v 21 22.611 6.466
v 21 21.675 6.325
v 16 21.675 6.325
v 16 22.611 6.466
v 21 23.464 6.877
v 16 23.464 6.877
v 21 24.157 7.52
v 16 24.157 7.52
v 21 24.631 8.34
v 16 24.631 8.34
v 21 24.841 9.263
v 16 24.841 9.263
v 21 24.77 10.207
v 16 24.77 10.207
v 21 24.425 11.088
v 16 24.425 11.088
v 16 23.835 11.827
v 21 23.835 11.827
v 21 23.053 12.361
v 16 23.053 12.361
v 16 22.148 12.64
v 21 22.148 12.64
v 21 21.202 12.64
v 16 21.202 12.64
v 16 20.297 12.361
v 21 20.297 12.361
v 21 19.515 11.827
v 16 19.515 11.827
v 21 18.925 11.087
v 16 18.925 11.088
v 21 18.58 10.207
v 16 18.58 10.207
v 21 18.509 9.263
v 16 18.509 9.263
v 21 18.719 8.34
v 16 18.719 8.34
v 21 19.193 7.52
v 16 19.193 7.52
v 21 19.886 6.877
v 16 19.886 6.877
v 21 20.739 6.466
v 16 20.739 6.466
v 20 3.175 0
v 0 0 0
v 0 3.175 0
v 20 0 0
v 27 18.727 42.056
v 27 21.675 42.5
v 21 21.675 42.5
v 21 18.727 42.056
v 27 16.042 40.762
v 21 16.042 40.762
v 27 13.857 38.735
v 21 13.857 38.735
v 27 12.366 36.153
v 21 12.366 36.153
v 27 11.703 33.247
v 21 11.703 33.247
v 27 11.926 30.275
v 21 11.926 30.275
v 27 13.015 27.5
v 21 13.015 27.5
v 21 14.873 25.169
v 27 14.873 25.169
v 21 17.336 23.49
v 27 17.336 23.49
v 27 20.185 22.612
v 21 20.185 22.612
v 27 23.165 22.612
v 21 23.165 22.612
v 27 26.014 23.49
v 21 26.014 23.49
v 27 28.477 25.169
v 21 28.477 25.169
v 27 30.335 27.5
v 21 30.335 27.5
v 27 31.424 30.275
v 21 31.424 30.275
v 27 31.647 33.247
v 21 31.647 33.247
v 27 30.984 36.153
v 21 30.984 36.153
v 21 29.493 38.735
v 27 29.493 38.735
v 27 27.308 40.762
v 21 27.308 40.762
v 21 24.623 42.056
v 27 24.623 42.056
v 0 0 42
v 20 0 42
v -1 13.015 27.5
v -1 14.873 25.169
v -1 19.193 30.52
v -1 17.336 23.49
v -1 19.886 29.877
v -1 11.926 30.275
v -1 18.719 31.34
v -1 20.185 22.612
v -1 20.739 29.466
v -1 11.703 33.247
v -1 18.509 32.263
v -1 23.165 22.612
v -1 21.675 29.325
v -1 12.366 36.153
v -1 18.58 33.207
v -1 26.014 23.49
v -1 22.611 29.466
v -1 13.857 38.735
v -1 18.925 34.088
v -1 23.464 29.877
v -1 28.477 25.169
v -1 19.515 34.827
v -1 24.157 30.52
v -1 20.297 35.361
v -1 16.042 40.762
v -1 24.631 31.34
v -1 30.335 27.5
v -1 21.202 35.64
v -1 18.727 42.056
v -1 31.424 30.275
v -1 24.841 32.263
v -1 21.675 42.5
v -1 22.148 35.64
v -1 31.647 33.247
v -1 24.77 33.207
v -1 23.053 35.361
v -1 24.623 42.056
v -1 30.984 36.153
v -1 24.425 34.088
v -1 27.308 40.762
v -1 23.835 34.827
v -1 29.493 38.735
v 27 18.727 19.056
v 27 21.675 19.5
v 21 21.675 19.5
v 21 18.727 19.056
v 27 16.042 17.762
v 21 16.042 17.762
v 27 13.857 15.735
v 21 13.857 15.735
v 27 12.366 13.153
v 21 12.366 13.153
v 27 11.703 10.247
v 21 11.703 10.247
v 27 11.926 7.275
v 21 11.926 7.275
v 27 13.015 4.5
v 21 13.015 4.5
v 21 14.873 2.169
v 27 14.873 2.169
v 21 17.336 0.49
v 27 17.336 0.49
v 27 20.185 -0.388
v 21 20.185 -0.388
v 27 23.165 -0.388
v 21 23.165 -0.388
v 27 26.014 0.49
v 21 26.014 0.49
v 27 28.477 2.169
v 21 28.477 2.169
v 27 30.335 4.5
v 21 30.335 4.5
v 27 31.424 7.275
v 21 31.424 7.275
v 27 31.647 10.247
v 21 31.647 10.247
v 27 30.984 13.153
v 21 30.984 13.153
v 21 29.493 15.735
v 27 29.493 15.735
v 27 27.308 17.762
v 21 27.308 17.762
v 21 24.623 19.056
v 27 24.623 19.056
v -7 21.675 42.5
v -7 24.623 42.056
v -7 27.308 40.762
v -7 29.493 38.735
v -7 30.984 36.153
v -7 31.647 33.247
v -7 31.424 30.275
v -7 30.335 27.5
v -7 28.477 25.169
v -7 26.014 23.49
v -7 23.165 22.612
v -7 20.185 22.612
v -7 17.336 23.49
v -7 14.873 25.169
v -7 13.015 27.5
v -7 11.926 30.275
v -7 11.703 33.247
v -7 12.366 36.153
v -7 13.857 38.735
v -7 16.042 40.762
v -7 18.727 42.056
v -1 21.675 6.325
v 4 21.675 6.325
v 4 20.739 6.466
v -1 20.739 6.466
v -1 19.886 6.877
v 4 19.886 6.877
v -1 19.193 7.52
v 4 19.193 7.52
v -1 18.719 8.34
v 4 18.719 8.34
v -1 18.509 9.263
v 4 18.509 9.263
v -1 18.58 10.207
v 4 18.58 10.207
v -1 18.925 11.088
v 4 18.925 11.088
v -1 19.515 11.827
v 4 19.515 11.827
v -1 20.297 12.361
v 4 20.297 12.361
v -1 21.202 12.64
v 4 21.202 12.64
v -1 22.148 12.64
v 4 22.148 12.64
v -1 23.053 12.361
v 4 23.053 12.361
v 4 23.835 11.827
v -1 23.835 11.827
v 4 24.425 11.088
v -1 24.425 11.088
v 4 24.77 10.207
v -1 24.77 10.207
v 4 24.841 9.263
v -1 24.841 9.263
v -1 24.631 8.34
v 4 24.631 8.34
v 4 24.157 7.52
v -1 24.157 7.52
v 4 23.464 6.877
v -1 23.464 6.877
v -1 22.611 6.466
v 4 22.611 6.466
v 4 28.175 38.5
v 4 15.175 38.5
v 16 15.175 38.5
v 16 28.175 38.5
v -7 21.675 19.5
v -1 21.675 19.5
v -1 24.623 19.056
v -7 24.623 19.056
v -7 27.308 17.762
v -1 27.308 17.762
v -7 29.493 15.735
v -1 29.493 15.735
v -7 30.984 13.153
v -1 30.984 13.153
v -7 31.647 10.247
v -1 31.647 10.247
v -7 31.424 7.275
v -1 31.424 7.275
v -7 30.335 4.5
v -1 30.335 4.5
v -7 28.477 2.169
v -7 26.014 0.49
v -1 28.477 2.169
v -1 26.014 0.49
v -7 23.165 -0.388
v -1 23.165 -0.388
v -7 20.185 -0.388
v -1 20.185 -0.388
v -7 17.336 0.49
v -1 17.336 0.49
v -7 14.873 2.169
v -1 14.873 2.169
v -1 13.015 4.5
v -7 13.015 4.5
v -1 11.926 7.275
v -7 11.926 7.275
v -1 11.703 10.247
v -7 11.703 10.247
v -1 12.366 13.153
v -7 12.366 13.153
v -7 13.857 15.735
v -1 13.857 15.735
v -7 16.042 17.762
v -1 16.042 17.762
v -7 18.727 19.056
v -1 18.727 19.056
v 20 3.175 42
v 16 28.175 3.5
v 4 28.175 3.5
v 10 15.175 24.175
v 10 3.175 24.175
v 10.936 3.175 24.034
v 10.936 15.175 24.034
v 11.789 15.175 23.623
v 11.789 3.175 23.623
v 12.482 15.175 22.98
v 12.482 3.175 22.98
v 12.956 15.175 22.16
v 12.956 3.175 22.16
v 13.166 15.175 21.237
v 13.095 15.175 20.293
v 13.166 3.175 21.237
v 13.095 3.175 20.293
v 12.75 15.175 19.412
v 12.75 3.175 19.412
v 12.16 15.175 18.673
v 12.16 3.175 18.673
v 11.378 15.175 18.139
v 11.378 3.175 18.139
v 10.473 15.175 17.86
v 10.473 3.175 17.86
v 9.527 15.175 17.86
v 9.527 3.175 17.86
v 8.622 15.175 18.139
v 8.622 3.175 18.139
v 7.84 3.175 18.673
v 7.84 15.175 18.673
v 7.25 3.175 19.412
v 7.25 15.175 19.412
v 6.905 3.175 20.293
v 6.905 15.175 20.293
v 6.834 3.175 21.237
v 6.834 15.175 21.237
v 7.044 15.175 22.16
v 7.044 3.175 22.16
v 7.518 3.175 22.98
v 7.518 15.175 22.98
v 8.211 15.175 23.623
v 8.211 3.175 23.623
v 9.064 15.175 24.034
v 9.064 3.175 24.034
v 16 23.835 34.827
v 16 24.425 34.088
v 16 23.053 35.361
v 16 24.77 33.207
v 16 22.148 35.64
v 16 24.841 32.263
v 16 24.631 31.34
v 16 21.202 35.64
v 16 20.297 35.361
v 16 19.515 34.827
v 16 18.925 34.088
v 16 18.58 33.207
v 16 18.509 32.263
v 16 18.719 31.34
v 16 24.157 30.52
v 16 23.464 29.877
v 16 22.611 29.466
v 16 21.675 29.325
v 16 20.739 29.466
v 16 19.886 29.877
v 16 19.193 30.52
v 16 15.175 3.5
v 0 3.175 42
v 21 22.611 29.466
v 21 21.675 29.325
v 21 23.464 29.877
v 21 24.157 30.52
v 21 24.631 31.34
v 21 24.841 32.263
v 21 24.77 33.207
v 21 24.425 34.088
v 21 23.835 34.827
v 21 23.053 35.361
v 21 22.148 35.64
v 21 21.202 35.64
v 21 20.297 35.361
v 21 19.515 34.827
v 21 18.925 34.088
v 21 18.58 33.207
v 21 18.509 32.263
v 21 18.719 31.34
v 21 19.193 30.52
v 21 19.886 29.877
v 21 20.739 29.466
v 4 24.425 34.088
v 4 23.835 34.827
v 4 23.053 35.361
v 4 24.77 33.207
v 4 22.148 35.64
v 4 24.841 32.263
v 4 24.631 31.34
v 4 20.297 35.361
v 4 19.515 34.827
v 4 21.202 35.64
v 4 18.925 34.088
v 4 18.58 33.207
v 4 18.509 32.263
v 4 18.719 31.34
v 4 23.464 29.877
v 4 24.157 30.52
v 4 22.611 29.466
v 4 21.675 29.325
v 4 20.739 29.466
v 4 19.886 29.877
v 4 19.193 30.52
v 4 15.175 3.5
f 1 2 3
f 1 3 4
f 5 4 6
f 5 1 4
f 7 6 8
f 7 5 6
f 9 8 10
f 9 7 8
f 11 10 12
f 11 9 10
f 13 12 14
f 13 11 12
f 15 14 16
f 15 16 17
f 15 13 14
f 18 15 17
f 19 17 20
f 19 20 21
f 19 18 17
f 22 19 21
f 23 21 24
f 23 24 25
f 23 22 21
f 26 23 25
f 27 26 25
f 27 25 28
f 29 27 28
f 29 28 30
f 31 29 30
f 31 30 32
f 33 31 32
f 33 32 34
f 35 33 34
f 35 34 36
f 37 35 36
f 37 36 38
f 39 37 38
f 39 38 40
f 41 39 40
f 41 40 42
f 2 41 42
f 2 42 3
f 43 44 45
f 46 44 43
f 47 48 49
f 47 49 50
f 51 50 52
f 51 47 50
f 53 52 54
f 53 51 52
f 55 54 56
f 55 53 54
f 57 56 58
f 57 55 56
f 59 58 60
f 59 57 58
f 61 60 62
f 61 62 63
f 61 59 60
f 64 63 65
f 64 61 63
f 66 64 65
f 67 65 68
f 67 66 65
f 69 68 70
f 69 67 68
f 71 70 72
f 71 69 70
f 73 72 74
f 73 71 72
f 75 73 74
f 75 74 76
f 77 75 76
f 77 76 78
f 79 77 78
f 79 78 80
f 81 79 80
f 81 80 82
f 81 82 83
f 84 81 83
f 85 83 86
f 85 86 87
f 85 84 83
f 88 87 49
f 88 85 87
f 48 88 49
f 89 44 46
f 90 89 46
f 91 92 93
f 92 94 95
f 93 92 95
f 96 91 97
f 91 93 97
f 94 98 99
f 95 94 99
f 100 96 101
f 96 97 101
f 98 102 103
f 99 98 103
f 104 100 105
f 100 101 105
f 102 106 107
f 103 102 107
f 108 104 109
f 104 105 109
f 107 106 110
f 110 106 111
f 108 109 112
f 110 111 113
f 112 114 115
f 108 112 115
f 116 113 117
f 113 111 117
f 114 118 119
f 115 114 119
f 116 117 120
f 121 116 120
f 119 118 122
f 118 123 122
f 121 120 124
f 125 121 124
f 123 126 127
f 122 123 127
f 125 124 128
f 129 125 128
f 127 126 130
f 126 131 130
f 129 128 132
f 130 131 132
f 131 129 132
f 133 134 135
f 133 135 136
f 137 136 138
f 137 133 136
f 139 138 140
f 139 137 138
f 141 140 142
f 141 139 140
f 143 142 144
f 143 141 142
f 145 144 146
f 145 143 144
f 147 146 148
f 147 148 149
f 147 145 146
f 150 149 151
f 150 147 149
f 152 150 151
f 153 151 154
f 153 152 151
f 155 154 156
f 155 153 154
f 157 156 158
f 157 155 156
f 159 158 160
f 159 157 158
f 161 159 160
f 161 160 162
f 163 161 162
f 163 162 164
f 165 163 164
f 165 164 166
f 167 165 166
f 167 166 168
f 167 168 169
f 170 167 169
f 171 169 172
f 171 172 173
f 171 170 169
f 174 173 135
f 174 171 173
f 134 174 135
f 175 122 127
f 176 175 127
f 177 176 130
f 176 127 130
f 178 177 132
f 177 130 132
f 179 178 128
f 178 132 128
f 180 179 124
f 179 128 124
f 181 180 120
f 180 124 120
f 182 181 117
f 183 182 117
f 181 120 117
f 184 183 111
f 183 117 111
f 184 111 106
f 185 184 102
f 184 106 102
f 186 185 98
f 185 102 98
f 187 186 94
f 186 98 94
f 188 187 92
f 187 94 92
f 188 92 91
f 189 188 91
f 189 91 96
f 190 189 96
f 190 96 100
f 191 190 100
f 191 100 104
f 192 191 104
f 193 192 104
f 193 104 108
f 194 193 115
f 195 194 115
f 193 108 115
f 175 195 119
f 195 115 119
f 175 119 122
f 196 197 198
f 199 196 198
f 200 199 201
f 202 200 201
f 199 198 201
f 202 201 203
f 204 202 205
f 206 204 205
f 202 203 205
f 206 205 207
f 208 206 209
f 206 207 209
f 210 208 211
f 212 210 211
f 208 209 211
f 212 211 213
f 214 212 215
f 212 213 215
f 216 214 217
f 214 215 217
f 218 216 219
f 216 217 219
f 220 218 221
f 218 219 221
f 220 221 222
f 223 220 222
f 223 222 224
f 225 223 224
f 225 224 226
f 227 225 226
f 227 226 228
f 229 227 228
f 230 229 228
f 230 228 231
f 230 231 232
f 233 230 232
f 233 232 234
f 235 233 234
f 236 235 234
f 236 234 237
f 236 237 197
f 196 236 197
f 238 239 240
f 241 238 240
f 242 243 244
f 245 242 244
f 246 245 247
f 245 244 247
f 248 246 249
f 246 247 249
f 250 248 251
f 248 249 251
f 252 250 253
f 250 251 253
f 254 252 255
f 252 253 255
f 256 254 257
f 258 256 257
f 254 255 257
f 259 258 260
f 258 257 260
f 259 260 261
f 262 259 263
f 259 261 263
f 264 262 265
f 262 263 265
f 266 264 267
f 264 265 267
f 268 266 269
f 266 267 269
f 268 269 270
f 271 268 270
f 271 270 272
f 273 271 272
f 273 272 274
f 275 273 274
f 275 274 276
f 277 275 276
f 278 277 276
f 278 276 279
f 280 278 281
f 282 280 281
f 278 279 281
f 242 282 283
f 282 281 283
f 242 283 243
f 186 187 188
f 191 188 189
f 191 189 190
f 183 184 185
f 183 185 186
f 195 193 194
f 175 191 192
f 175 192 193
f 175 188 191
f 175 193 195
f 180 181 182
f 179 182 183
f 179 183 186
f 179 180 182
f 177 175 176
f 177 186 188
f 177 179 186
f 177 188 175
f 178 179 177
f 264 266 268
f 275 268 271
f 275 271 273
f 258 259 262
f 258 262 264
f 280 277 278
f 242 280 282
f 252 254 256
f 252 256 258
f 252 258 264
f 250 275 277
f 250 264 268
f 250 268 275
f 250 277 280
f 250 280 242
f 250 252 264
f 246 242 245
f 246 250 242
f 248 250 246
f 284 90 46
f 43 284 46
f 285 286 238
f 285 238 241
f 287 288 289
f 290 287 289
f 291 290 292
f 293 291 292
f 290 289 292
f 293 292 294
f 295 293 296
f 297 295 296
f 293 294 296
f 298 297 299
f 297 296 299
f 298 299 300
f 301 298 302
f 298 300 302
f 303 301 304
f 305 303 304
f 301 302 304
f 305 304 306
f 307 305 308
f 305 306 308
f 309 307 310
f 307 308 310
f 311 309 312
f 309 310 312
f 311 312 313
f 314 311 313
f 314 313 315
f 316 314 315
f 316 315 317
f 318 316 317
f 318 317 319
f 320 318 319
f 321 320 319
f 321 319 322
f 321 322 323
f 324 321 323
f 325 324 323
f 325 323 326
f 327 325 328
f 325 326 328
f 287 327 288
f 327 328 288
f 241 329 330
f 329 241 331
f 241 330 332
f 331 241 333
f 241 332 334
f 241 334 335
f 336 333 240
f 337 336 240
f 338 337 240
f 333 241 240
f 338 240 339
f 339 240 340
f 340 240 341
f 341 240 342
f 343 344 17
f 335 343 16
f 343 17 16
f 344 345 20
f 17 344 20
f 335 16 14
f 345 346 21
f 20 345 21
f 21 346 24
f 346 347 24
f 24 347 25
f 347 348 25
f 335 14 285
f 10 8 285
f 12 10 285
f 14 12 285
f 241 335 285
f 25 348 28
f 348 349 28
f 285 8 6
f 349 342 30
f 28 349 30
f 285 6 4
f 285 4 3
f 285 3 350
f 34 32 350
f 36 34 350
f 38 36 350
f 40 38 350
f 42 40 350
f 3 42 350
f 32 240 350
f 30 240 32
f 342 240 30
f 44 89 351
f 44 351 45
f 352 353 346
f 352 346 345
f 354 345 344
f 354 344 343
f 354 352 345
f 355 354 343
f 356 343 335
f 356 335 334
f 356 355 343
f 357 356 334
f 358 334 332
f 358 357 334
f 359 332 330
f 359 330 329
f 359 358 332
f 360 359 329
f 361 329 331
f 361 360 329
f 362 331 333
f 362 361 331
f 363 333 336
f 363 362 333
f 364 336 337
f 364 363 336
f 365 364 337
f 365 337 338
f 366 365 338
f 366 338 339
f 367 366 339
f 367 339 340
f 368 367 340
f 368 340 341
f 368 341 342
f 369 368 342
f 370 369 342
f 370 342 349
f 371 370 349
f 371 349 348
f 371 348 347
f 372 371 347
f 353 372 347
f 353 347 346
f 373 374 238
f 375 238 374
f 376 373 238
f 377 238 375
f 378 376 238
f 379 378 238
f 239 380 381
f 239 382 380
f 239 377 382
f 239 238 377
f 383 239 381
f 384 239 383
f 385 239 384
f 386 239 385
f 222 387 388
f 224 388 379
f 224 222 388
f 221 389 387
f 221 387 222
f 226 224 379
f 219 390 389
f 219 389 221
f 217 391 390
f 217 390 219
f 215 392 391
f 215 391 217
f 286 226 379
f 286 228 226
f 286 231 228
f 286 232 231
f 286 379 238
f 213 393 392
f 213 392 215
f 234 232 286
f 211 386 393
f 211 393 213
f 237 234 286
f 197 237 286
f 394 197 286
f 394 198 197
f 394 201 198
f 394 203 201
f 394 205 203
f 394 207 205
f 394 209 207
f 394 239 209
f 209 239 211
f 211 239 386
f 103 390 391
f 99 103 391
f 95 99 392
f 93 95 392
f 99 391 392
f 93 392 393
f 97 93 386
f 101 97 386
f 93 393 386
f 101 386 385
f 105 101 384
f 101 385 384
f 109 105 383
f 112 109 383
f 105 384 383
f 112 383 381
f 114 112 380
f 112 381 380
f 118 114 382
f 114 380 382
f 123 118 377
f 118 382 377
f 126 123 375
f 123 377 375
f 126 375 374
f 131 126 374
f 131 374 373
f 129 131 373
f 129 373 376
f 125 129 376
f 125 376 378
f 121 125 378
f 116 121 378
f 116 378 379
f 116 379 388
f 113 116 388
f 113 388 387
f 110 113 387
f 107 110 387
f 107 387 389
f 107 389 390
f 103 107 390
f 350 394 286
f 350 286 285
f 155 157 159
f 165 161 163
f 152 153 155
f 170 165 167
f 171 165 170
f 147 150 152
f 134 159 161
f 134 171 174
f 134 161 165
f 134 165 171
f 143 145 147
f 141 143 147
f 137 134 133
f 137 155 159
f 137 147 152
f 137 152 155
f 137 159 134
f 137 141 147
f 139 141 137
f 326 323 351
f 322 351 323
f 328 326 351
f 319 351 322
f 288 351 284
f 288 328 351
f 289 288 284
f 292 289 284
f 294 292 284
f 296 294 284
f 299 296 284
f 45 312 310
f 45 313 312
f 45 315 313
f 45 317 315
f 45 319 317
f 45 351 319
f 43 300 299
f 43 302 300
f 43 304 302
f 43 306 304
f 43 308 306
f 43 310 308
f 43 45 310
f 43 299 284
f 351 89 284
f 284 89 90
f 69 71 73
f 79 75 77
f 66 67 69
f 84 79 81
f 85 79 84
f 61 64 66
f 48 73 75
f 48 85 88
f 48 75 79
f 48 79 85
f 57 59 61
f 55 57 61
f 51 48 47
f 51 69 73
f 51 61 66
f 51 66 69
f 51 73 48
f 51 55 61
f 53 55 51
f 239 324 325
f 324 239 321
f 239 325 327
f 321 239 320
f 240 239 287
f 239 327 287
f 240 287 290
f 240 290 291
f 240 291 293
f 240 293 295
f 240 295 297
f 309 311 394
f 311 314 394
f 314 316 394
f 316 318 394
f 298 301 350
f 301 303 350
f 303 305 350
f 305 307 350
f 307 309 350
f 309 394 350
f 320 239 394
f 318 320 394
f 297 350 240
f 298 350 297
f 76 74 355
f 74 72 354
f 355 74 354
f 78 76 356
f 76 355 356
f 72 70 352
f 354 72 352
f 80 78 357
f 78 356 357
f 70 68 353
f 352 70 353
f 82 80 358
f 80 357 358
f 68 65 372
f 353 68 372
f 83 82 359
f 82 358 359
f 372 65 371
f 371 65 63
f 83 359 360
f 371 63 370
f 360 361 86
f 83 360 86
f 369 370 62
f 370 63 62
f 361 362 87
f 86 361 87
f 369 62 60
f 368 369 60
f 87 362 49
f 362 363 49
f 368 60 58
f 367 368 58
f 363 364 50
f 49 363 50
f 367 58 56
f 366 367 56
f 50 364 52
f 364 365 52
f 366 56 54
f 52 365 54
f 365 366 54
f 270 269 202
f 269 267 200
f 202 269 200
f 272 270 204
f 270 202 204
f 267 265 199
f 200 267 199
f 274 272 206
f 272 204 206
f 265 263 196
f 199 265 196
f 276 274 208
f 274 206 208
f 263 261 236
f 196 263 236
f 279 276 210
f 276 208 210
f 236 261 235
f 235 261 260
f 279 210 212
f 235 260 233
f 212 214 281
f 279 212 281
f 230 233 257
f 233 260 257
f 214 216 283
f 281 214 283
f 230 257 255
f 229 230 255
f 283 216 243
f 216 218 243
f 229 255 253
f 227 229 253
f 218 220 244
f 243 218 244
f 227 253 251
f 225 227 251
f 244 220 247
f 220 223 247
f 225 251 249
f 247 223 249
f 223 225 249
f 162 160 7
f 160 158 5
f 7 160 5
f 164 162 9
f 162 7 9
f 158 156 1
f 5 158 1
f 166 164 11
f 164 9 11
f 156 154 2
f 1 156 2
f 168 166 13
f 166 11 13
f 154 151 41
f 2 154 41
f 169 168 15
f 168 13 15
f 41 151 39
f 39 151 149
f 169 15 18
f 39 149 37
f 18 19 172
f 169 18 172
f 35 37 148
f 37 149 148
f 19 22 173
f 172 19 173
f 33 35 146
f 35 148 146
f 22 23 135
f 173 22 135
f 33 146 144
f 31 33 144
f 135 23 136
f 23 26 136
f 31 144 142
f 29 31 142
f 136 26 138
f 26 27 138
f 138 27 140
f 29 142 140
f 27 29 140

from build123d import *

# Parameters (mm, degrees)
CROQUIS1_W              = 20
CROQUIS1_H              = 42
SALIENTE_EXTRUIR1_DEPTH = 3.175
CROQUIS2_R              = 3.175
SALIENTE_EXTRUIR2_DEPTH = 12
CROQUIS3_W              = 12
CROQUIS3_H              = 35
SALIENTE_EXTRUIR3_DEPTH = 13
CROQUIS4_R              = 3.175
SALIENTE_EXTRUIR4_DEPTH = 11
SALIENTE_EXTRUIR5_START = 11
CROQUIS5_R              = 3.175
SALIENTE_EXTRUIR5_DEPTH = 11
SALIENTE_EXTRUIR6_START = -6
CROQUIS6_R              = 10
CROQUIS6_R_2            = 3.175
SALIENTE_EXTRUIR6_DEPTH = 6
CROQUIS7_R              = 10
CROQUIS7_R_2            = 3.175
SALIENTE_EXTRUIR7_DEPTH = 6


with BuildPart() as part:
    # Croquis1 → Saliente-Extruir1 (new body)
    with BuildSketch(Plane(origin=(0, 0, 0), x_dir=(1, 0, 0), z_dir=(0, 1, 0))):
        with Locations((10, -21)):
            Rectangle(CROQUIS1_W, CROQUIS1_H)
    extrude(amount=SALIENTE_EXTRUIR1_DEPTH)

    # Croquis2 → Saliente-Extruir2 (add)
    with BuildSketch(Plane(origin=(0, 3.175, 0), x_dir=(1, 0, 0), z_dir=(0, 1, 0))):
        with Locations(Location((10, -21, 0), (0, 0, 270))):
            Circle(CROQUIS2_R)
    extrude(amount=SALIENTE_EXTRUIR2_DEPTH)

    # Croquis3 → Saliente-Extruir3 (add)
    with BuildSketch(Plane(origin=(0, 15.175, 0), x_dir=(1, 0, 0), z_dir=(0, 1, 0))):
        with Locations((10, -21)):
            Rectangle(CROQUIS3_W, CROQUIS3_H)
    extrude(amount=SALIENTE_EXTRUIR3_DEPTH)

    # Croquis4 → Saliente-Extruir4 (add)
    with BuildSketch(Plane.ZY.offset(-4)):
        with Locations(Location((9.5, 21.675, 0), (0, 0, 180))):
            Circle(CROQUIS4_R)
        with Locations(Location((32.5, 21.675, 0), (0, 0, 180))):
            Circle(CROQUIS4_R)
    extrude(amount=SALIENTE_EXTRUIR4_DEPTH)

    # Croquis5 → Saliente-Extruir5 (add)
    with BuildSketch(Plane(origin=(16, 0, 0), x_dir=(0, 0, -1), z_dir=(1, 0, 0)).offset(SALIENTE_EXTRUIR5_START)):
        with Locations((-32.5, 21.675)):
            Circle(CROQUIS5_R)
        with Locations((-9.5, 21.675)):
            Circle(CROQUIS5_R)
    extrude(amount=-SALIENTE_EXTRUIR5_DEPTH)

    # Croquis6 → Saliente-Extruir6 (add)
    # profile 1 of 2: a face of its own
    with BuildSketch(Plane.ZY.offset(7).offset(SALIENTE_EXTRUIR6_START)):
        with Locations((9.5, 21.675)):
            Circle(CROQUIS6_R)
        with Locations(Location((9.5, 21.675, 0), (0, 0, 180))):
            Circle(CROQUIS6_R_2, mode=Mode.SUBTRACT)
    # profile 2 of 2: a face of its own
    with BuildSketch(Plane.ZY.offset(7).offset(SALIENTE_EXTRUIR6_START)):
        with Locations((32.5, 21.675)):
            Circle(CROQUIS6_R)
        with Locations(Location((32.5, 21.675, 0), (0, 0, 180))):
            Circle(CROQUIS6_R_2, mode=Mode.SUBTRACT)
    extrude(amount=SALIENTE_EXTRUIR6_DEPTH)

    # Croquis7 → Saliente-Extruir7 (add)
    # profile 1 of 2: a face of its own
    with BuildSketch(Plane(origin=(27, 0, 0), x_dir=(0, 0, -1), z_dir=(1, 0, 0))):
        with Locations(Location((-32.5, 21.675, 0), (0, 0, 180))):
            Circle(CROQUIS7_R)
        with Locations(Location((-32.5, 21.675, 0), (0, 0, 180))):
            Circle(CROQUIS7_R_2, mode=Mode.SUBTRACT)
    # profile 2 of 2: a face of its own
    with BuildSketch(Plane(origin=(27, 0, 0), x_dir=(0, 0, -1), z_dir=(1, 0, 0))):
        with Locations(Location((-9.5, 21.675, 0), (0, 0, 180))):
            Circle(CROQUIS7_R)
        with Locations(Location((-9.5, 21.675, 0), (0, 0, 180))):
            Circle(CROQUIS7_R_2, mode=Mode.SUBTRACT)
    extrude(amount=-SALIENTE_EXTRUIR7_DEPTH)


solid = part.part
